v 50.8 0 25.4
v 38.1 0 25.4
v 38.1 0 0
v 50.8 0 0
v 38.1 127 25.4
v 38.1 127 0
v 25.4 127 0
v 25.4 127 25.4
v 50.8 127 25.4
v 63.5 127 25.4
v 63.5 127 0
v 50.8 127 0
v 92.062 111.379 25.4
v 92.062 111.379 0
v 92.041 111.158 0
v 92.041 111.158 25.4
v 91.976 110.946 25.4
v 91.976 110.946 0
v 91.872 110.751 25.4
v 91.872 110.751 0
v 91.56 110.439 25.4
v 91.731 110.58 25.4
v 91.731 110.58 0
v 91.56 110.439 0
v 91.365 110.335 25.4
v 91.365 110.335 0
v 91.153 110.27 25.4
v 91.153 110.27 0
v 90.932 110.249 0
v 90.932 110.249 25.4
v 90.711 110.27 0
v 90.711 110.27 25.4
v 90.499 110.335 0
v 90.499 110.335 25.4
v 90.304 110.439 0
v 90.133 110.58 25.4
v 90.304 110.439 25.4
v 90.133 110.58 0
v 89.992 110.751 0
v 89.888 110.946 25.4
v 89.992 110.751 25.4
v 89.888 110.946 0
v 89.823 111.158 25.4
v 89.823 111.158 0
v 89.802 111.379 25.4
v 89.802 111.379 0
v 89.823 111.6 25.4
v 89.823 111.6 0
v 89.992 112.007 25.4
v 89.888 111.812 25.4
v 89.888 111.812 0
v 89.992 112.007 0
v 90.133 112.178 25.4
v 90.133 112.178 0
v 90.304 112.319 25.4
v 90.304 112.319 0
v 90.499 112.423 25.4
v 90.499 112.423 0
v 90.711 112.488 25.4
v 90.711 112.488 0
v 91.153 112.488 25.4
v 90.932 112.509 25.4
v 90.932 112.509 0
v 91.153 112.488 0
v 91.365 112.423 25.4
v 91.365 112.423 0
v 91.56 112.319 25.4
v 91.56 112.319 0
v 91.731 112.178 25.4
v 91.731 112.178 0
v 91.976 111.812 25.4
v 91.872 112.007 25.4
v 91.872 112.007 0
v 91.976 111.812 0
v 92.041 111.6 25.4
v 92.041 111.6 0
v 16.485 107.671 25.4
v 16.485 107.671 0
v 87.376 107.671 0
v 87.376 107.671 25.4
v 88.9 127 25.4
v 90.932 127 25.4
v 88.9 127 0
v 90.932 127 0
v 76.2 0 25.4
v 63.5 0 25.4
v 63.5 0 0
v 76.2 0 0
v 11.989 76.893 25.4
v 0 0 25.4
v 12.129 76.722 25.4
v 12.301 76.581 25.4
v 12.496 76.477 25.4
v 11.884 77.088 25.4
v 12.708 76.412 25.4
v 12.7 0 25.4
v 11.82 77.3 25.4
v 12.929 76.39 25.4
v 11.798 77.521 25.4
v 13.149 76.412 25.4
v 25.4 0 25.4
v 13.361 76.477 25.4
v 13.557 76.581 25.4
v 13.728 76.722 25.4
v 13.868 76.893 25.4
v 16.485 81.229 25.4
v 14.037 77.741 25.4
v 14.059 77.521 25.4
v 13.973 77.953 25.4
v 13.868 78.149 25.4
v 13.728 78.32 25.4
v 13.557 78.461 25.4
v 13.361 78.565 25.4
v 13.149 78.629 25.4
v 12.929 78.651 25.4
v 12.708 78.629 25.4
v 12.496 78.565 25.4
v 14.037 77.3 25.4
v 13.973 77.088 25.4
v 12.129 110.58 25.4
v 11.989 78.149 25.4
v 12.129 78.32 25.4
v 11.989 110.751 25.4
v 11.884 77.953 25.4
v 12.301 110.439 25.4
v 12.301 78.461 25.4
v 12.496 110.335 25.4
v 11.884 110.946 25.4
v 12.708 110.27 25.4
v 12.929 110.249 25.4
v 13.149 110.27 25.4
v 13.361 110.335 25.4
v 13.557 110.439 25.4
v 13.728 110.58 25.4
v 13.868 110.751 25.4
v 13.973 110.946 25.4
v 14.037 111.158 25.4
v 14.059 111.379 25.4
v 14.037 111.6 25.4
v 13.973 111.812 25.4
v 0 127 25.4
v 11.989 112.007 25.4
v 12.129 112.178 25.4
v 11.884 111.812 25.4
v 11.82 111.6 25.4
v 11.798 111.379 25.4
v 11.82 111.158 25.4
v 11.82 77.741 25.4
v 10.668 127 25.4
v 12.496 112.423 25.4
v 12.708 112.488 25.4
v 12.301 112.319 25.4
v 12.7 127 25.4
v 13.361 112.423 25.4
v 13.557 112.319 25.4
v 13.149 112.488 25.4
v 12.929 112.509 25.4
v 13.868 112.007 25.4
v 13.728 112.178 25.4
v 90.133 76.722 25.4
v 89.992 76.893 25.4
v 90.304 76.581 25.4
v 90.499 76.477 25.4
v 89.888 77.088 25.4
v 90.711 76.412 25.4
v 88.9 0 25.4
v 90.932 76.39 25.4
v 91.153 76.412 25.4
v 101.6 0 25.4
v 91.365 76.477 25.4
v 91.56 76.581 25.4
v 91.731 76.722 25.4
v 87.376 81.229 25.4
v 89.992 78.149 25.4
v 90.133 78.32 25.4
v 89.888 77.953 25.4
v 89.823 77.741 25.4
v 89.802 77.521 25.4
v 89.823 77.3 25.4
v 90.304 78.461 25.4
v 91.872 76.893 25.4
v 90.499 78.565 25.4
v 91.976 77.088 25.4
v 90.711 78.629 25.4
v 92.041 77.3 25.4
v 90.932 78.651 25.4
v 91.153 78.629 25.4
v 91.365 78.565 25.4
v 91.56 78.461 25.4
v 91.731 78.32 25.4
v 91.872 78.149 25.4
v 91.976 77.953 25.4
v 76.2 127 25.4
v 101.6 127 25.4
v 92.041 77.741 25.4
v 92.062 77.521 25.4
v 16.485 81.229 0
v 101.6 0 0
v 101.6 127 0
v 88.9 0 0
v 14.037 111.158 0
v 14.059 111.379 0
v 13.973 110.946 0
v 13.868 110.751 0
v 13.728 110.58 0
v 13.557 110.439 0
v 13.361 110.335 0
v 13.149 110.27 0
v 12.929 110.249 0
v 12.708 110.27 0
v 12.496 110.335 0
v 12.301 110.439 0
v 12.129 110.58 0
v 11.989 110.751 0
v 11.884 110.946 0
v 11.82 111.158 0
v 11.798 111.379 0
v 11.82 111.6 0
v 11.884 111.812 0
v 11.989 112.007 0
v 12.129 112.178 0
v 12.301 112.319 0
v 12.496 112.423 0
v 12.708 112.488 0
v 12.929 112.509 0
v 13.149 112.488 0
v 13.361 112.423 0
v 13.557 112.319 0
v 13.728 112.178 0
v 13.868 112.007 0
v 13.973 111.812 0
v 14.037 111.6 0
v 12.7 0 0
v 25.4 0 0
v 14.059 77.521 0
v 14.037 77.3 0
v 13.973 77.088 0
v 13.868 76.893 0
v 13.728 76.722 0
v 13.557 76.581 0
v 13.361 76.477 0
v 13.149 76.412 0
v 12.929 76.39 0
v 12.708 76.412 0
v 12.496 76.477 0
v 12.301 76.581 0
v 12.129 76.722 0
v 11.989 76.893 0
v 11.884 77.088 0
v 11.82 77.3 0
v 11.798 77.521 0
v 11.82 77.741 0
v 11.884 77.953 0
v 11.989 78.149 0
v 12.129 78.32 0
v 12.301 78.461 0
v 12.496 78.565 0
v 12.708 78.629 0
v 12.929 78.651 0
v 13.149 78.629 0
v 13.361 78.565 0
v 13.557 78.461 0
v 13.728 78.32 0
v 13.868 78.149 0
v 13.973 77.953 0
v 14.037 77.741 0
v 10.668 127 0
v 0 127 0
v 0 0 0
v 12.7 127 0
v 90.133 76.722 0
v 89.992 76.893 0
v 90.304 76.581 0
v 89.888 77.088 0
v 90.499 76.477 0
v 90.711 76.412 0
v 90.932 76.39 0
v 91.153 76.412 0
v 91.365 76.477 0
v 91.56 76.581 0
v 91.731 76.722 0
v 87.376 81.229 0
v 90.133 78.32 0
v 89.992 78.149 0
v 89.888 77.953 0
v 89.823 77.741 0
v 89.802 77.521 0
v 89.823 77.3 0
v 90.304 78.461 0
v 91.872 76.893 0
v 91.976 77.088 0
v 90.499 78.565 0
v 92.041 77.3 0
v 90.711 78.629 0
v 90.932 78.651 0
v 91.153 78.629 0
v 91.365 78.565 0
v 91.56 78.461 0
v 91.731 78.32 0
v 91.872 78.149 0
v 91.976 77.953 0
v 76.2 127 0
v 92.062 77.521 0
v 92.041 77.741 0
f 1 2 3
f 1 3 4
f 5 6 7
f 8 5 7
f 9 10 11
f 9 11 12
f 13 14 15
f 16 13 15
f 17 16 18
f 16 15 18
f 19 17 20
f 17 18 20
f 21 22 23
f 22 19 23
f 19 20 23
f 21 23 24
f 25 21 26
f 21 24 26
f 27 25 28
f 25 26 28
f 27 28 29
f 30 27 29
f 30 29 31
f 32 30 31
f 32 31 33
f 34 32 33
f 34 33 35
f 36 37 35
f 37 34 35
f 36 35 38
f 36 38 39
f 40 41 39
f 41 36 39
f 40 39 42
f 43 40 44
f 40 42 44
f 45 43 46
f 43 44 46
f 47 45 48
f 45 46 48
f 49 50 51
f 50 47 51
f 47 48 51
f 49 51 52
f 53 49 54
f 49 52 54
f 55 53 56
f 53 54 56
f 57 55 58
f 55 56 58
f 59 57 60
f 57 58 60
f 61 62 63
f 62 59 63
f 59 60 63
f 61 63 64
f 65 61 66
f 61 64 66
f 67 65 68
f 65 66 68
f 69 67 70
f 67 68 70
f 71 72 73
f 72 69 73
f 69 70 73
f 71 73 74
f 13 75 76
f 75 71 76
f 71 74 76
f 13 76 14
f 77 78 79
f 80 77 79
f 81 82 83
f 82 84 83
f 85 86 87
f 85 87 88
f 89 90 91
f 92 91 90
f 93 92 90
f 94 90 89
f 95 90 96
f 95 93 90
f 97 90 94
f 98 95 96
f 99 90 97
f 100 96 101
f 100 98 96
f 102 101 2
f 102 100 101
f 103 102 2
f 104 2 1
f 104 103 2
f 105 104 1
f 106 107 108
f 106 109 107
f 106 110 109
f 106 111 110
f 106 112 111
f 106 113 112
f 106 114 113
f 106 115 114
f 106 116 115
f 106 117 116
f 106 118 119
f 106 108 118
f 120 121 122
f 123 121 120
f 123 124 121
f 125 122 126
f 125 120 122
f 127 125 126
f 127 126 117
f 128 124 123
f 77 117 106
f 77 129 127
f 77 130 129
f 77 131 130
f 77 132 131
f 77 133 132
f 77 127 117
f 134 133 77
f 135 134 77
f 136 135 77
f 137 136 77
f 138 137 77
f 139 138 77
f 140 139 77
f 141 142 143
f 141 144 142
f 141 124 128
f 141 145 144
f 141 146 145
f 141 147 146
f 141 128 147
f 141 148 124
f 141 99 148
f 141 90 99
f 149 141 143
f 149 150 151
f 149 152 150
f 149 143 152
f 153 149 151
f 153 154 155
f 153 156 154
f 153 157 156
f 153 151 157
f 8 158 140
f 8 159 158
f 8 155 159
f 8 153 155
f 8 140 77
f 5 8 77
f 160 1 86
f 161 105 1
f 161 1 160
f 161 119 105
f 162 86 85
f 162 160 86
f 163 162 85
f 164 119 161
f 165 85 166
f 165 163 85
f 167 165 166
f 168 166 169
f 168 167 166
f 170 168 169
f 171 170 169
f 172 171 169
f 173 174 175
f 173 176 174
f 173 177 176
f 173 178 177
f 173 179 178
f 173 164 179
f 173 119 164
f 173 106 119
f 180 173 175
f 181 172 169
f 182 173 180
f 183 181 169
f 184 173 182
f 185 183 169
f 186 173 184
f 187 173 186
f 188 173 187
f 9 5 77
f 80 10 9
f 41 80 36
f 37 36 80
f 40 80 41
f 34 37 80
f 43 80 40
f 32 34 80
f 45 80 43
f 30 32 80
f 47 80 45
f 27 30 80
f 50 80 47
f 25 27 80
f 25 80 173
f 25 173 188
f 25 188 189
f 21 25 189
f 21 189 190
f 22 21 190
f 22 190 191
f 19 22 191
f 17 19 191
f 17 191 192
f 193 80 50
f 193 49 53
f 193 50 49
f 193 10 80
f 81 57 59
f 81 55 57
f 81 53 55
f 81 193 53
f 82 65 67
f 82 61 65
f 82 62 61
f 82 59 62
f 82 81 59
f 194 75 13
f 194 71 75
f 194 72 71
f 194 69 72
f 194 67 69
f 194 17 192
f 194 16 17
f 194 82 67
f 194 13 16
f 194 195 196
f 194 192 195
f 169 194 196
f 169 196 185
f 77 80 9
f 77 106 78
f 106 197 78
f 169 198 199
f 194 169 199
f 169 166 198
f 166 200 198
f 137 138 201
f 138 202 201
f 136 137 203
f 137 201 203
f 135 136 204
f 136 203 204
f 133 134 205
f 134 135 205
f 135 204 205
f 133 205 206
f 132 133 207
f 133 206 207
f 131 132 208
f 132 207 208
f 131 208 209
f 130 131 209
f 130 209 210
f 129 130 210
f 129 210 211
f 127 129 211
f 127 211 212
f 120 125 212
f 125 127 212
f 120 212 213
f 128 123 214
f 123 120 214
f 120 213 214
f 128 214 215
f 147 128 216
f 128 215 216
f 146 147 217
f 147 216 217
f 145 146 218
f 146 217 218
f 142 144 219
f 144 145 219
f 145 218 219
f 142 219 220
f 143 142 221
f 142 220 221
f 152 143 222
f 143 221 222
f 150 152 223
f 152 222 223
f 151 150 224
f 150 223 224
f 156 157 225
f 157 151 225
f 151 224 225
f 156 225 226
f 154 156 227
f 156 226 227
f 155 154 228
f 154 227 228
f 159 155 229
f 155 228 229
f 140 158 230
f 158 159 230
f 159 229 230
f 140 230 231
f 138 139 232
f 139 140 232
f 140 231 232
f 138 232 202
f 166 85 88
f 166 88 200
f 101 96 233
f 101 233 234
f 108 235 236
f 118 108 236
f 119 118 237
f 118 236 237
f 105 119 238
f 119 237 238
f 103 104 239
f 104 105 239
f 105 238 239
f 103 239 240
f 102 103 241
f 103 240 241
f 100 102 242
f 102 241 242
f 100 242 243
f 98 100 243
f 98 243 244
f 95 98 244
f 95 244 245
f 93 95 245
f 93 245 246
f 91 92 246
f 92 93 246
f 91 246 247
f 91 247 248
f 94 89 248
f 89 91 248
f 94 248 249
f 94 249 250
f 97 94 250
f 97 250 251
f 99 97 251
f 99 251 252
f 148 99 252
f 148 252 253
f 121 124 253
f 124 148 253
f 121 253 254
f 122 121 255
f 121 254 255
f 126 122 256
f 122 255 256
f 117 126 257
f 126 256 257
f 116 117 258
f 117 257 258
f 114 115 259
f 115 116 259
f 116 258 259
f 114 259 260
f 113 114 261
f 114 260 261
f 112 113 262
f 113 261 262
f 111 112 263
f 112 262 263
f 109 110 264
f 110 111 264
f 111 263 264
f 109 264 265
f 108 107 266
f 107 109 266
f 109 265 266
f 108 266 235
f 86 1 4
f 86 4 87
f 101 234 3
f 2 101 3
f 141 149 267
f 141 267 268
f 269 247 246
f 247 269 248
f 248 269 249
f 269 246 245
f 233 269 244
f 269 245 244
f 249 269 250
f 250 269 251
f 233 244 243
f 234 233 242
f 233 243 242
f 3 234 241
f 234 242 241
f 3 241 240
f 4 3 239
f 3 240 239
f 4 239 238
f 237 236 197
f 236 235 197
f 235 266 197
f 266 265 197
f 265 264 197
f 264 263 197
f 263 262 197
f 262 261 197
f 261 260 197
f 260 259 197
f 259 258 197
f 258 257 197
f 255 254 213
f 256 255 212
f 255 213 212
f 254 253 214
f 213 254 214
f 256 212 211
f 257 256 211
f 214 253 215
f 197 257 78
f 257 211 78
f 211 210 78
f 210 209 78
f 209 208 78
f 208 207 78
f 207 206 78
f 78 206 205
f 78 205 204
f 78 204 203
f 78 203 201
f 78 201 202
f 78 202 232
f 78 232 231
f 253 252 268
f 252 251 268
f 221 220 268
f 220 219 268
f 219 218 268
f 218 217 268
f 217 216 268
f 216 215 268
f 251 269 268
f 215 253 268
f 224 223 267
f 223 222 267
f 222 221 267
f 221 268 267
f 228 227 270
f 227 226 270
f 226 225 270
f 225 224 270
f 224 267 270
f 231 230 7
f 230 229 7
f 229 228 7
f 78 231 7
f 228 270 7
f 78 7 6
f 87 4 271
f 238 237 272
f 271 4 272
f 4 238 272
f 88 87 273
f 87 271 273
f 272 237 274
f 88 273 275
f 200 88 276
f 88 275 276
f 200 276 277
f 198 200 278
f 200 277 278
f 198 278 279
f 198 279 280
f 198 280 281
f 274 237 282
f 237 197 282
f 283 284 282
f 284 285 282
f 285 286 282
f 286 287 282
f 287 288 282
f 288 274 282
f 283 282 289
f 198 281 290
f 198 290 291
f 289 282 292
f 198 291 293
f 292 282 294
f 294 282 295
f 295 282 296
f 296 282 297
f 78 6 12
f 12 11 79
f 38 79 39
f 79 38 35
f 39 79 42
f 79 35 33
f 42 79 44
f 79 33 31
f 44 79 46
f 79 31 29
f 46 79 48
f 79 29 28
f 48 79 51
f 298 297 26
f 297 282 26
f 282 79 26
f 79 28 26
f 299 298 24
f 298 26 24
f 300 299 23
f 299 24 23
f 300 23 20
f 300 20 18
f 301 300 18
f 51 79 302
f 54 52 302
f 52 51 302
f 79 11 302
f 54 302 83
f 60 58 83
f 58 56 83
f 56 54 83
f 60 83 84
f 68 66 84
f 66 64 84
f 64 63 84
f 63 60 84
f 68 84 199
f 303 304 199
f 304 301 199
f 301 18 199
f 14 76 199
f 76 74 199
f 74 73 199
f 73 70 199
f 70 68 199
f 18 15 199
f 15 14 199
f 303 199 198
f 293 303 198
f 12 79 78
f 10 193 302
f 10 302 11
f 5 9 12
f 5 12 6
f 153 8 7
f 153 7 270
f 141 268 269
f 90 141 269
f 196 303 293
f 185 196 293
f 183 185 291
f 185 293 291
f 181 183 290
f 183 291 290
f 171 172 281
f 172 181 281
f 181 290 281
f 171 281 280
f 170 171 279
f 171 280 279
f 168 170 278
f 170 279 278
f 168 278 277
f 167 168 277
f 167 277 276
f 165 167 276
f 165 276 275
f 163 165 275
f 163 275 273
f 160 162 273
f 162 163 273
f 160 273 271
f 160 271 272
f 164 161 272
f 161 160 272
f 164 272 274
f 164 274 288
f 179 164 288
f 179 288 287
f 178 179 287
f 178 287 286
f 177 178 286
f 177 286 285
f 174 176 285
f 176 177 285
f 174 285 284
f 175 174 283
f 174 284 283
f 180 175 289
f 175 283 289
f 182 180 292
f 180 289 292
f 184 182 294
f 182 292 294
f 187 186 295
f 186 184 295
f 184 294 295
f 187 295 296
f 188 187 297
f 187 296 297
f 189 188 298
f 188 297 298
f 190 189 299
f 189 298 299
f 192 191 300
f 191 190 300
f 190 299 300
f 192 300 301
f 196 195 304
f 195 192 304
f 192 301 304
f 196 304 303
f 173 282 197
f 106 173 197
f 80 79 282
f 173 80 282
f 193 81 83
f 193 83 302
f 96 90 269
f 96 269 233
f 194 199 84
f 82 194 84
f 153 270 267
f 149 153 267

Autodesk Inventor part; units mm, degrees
ref_plane "YZ Plane" through (0, 0, 0) normal (1, 0, 0) x (0, 1, 0)
ref_plane "XZ Plane" through (0, 0, 0) normal (0, 1, 0) x (-1, 0, 0)
ref_plane "XY Plane" through (0, 0, 0) normal (0, 0, 1) x (1, 0, 0)
sketch "Sketch1" plane through (0, 0, 0) normal (0, 0, 1) x (1, 0, 0)
  line L0 (0, 0) -> (101.6, 0)
  line L1 (101.6, 0) -> (101.6, 127)
  line L2 (101.6, 127) -> (0, 127)
  line L3 (0, 127) -> (0, 0)
  line L4 (0, 127) -> (10.668, 127)
  line L5 (101.6, 127) -> (90.932, 127)
  circle A0 centre (90.932, 77.5208) radius 1.1303
  line L6 (87.376, 81.2292) -> (16.4846, 81.2292)
  line L7 (16.4846, 81.2292) -> (16.4846, 107.6706)
  line L8 (16.4846, 107.6706) -> (87.376, 107.6706)
  line L9 (87.376, 107.6706) -> (87.376, 81.2292)
  circle A1 centre (12.9286, 111.379) radius 1.1303
  circle A2 centre (12.9286, 77.5208) radius 1.1303
  circle A3 centre (90.932, 111.379) radius 1.1303
  line L10 (0, 0) -> (12.7, 0)
  line L11 (12.7, 0) -> (12.7, -4.064)
  line L12 (12.7, -4.064) -> (0, -4.064)
  line L13 (0, -4.064) -> (0, 0)
  line L14 (25.4, -4.064) -> (38.1, -4.064)
  line L15 (38.1, -4.064) -> (38.1, 0)
  line L16 (38.1, 0) -> (25.4, 0)
  line L17 (25.4, 0) -> (25.4, -4.064)
  line L18 (50.8, -4.064) -> (63.5, -4.064)
  line L19 (63.5, -4.064) -> (63.5, 0)
  line L20 (63.5, 0) -> (50.8, 0)
  line L21 (50.8, 0) -> (50.8, -4.064)
  line L22 (76.2, -4.064) -> (88.9, -4.064)
  line L23 (88.9, -4.064) -> (88.9, 0)
  line L24 (88.9, 0) -> (76.2, 0)
  line L25 (76.2, 0) -> (76.2, -4.064)
  line L26 (12.7, 127) -> (12.7, 131.064)
  line L27 (12.7, 131.064) -> (0, 131.064)
  line L28 (0, 131.064) -> (0, 127)
  line L29 (25.4, 131.064) -> (38.1, 131.064)
  line L30 (38.1, 131.064) -> (38.1, 127)
  line L31 (25.4, 127) -> (25.4, 131.064)
  line L32 (50.8, 131.064) -> (63.5, 131.064)
  line L33 (63.5, 131.064) -> (63.5, 127)
  line L34 (50.8, 127) -> (50.8, 131.064)
  line L35 (76.2, 131.064) -> (88.9, 131.064)
  line L36 (88.9, 131.064) -> (88.9, 127)
  line L37 (76.2, 127) -> (76.2, 131.064)
  dimension "d0" = 101.6
  dimension "d1" = 127
  dimension "d2" = 10.668
  dimension "d3" = 10.668
  dimension "d7" = 2.2606
  dimension "d23" = 2.2606
  dimension "d24" = 2.2606
  dimension "d25" = 2.2606
  dimension "d28" = 12.7
  dimension "d29" = 4.064
  dimension "d30" = 12.7
  dimension "d31" = 12.7
  dimension "d32" = 12.7
  dimension "d33" = 12.7
  dimension "d34" = 12.7
  dimension "d35" = 12.7
extrude "Extrusion1" add sketch "Sketch1" along normal blind 25.4 contours L3 L2 L1 L0
properties part number "ProtoFront"
